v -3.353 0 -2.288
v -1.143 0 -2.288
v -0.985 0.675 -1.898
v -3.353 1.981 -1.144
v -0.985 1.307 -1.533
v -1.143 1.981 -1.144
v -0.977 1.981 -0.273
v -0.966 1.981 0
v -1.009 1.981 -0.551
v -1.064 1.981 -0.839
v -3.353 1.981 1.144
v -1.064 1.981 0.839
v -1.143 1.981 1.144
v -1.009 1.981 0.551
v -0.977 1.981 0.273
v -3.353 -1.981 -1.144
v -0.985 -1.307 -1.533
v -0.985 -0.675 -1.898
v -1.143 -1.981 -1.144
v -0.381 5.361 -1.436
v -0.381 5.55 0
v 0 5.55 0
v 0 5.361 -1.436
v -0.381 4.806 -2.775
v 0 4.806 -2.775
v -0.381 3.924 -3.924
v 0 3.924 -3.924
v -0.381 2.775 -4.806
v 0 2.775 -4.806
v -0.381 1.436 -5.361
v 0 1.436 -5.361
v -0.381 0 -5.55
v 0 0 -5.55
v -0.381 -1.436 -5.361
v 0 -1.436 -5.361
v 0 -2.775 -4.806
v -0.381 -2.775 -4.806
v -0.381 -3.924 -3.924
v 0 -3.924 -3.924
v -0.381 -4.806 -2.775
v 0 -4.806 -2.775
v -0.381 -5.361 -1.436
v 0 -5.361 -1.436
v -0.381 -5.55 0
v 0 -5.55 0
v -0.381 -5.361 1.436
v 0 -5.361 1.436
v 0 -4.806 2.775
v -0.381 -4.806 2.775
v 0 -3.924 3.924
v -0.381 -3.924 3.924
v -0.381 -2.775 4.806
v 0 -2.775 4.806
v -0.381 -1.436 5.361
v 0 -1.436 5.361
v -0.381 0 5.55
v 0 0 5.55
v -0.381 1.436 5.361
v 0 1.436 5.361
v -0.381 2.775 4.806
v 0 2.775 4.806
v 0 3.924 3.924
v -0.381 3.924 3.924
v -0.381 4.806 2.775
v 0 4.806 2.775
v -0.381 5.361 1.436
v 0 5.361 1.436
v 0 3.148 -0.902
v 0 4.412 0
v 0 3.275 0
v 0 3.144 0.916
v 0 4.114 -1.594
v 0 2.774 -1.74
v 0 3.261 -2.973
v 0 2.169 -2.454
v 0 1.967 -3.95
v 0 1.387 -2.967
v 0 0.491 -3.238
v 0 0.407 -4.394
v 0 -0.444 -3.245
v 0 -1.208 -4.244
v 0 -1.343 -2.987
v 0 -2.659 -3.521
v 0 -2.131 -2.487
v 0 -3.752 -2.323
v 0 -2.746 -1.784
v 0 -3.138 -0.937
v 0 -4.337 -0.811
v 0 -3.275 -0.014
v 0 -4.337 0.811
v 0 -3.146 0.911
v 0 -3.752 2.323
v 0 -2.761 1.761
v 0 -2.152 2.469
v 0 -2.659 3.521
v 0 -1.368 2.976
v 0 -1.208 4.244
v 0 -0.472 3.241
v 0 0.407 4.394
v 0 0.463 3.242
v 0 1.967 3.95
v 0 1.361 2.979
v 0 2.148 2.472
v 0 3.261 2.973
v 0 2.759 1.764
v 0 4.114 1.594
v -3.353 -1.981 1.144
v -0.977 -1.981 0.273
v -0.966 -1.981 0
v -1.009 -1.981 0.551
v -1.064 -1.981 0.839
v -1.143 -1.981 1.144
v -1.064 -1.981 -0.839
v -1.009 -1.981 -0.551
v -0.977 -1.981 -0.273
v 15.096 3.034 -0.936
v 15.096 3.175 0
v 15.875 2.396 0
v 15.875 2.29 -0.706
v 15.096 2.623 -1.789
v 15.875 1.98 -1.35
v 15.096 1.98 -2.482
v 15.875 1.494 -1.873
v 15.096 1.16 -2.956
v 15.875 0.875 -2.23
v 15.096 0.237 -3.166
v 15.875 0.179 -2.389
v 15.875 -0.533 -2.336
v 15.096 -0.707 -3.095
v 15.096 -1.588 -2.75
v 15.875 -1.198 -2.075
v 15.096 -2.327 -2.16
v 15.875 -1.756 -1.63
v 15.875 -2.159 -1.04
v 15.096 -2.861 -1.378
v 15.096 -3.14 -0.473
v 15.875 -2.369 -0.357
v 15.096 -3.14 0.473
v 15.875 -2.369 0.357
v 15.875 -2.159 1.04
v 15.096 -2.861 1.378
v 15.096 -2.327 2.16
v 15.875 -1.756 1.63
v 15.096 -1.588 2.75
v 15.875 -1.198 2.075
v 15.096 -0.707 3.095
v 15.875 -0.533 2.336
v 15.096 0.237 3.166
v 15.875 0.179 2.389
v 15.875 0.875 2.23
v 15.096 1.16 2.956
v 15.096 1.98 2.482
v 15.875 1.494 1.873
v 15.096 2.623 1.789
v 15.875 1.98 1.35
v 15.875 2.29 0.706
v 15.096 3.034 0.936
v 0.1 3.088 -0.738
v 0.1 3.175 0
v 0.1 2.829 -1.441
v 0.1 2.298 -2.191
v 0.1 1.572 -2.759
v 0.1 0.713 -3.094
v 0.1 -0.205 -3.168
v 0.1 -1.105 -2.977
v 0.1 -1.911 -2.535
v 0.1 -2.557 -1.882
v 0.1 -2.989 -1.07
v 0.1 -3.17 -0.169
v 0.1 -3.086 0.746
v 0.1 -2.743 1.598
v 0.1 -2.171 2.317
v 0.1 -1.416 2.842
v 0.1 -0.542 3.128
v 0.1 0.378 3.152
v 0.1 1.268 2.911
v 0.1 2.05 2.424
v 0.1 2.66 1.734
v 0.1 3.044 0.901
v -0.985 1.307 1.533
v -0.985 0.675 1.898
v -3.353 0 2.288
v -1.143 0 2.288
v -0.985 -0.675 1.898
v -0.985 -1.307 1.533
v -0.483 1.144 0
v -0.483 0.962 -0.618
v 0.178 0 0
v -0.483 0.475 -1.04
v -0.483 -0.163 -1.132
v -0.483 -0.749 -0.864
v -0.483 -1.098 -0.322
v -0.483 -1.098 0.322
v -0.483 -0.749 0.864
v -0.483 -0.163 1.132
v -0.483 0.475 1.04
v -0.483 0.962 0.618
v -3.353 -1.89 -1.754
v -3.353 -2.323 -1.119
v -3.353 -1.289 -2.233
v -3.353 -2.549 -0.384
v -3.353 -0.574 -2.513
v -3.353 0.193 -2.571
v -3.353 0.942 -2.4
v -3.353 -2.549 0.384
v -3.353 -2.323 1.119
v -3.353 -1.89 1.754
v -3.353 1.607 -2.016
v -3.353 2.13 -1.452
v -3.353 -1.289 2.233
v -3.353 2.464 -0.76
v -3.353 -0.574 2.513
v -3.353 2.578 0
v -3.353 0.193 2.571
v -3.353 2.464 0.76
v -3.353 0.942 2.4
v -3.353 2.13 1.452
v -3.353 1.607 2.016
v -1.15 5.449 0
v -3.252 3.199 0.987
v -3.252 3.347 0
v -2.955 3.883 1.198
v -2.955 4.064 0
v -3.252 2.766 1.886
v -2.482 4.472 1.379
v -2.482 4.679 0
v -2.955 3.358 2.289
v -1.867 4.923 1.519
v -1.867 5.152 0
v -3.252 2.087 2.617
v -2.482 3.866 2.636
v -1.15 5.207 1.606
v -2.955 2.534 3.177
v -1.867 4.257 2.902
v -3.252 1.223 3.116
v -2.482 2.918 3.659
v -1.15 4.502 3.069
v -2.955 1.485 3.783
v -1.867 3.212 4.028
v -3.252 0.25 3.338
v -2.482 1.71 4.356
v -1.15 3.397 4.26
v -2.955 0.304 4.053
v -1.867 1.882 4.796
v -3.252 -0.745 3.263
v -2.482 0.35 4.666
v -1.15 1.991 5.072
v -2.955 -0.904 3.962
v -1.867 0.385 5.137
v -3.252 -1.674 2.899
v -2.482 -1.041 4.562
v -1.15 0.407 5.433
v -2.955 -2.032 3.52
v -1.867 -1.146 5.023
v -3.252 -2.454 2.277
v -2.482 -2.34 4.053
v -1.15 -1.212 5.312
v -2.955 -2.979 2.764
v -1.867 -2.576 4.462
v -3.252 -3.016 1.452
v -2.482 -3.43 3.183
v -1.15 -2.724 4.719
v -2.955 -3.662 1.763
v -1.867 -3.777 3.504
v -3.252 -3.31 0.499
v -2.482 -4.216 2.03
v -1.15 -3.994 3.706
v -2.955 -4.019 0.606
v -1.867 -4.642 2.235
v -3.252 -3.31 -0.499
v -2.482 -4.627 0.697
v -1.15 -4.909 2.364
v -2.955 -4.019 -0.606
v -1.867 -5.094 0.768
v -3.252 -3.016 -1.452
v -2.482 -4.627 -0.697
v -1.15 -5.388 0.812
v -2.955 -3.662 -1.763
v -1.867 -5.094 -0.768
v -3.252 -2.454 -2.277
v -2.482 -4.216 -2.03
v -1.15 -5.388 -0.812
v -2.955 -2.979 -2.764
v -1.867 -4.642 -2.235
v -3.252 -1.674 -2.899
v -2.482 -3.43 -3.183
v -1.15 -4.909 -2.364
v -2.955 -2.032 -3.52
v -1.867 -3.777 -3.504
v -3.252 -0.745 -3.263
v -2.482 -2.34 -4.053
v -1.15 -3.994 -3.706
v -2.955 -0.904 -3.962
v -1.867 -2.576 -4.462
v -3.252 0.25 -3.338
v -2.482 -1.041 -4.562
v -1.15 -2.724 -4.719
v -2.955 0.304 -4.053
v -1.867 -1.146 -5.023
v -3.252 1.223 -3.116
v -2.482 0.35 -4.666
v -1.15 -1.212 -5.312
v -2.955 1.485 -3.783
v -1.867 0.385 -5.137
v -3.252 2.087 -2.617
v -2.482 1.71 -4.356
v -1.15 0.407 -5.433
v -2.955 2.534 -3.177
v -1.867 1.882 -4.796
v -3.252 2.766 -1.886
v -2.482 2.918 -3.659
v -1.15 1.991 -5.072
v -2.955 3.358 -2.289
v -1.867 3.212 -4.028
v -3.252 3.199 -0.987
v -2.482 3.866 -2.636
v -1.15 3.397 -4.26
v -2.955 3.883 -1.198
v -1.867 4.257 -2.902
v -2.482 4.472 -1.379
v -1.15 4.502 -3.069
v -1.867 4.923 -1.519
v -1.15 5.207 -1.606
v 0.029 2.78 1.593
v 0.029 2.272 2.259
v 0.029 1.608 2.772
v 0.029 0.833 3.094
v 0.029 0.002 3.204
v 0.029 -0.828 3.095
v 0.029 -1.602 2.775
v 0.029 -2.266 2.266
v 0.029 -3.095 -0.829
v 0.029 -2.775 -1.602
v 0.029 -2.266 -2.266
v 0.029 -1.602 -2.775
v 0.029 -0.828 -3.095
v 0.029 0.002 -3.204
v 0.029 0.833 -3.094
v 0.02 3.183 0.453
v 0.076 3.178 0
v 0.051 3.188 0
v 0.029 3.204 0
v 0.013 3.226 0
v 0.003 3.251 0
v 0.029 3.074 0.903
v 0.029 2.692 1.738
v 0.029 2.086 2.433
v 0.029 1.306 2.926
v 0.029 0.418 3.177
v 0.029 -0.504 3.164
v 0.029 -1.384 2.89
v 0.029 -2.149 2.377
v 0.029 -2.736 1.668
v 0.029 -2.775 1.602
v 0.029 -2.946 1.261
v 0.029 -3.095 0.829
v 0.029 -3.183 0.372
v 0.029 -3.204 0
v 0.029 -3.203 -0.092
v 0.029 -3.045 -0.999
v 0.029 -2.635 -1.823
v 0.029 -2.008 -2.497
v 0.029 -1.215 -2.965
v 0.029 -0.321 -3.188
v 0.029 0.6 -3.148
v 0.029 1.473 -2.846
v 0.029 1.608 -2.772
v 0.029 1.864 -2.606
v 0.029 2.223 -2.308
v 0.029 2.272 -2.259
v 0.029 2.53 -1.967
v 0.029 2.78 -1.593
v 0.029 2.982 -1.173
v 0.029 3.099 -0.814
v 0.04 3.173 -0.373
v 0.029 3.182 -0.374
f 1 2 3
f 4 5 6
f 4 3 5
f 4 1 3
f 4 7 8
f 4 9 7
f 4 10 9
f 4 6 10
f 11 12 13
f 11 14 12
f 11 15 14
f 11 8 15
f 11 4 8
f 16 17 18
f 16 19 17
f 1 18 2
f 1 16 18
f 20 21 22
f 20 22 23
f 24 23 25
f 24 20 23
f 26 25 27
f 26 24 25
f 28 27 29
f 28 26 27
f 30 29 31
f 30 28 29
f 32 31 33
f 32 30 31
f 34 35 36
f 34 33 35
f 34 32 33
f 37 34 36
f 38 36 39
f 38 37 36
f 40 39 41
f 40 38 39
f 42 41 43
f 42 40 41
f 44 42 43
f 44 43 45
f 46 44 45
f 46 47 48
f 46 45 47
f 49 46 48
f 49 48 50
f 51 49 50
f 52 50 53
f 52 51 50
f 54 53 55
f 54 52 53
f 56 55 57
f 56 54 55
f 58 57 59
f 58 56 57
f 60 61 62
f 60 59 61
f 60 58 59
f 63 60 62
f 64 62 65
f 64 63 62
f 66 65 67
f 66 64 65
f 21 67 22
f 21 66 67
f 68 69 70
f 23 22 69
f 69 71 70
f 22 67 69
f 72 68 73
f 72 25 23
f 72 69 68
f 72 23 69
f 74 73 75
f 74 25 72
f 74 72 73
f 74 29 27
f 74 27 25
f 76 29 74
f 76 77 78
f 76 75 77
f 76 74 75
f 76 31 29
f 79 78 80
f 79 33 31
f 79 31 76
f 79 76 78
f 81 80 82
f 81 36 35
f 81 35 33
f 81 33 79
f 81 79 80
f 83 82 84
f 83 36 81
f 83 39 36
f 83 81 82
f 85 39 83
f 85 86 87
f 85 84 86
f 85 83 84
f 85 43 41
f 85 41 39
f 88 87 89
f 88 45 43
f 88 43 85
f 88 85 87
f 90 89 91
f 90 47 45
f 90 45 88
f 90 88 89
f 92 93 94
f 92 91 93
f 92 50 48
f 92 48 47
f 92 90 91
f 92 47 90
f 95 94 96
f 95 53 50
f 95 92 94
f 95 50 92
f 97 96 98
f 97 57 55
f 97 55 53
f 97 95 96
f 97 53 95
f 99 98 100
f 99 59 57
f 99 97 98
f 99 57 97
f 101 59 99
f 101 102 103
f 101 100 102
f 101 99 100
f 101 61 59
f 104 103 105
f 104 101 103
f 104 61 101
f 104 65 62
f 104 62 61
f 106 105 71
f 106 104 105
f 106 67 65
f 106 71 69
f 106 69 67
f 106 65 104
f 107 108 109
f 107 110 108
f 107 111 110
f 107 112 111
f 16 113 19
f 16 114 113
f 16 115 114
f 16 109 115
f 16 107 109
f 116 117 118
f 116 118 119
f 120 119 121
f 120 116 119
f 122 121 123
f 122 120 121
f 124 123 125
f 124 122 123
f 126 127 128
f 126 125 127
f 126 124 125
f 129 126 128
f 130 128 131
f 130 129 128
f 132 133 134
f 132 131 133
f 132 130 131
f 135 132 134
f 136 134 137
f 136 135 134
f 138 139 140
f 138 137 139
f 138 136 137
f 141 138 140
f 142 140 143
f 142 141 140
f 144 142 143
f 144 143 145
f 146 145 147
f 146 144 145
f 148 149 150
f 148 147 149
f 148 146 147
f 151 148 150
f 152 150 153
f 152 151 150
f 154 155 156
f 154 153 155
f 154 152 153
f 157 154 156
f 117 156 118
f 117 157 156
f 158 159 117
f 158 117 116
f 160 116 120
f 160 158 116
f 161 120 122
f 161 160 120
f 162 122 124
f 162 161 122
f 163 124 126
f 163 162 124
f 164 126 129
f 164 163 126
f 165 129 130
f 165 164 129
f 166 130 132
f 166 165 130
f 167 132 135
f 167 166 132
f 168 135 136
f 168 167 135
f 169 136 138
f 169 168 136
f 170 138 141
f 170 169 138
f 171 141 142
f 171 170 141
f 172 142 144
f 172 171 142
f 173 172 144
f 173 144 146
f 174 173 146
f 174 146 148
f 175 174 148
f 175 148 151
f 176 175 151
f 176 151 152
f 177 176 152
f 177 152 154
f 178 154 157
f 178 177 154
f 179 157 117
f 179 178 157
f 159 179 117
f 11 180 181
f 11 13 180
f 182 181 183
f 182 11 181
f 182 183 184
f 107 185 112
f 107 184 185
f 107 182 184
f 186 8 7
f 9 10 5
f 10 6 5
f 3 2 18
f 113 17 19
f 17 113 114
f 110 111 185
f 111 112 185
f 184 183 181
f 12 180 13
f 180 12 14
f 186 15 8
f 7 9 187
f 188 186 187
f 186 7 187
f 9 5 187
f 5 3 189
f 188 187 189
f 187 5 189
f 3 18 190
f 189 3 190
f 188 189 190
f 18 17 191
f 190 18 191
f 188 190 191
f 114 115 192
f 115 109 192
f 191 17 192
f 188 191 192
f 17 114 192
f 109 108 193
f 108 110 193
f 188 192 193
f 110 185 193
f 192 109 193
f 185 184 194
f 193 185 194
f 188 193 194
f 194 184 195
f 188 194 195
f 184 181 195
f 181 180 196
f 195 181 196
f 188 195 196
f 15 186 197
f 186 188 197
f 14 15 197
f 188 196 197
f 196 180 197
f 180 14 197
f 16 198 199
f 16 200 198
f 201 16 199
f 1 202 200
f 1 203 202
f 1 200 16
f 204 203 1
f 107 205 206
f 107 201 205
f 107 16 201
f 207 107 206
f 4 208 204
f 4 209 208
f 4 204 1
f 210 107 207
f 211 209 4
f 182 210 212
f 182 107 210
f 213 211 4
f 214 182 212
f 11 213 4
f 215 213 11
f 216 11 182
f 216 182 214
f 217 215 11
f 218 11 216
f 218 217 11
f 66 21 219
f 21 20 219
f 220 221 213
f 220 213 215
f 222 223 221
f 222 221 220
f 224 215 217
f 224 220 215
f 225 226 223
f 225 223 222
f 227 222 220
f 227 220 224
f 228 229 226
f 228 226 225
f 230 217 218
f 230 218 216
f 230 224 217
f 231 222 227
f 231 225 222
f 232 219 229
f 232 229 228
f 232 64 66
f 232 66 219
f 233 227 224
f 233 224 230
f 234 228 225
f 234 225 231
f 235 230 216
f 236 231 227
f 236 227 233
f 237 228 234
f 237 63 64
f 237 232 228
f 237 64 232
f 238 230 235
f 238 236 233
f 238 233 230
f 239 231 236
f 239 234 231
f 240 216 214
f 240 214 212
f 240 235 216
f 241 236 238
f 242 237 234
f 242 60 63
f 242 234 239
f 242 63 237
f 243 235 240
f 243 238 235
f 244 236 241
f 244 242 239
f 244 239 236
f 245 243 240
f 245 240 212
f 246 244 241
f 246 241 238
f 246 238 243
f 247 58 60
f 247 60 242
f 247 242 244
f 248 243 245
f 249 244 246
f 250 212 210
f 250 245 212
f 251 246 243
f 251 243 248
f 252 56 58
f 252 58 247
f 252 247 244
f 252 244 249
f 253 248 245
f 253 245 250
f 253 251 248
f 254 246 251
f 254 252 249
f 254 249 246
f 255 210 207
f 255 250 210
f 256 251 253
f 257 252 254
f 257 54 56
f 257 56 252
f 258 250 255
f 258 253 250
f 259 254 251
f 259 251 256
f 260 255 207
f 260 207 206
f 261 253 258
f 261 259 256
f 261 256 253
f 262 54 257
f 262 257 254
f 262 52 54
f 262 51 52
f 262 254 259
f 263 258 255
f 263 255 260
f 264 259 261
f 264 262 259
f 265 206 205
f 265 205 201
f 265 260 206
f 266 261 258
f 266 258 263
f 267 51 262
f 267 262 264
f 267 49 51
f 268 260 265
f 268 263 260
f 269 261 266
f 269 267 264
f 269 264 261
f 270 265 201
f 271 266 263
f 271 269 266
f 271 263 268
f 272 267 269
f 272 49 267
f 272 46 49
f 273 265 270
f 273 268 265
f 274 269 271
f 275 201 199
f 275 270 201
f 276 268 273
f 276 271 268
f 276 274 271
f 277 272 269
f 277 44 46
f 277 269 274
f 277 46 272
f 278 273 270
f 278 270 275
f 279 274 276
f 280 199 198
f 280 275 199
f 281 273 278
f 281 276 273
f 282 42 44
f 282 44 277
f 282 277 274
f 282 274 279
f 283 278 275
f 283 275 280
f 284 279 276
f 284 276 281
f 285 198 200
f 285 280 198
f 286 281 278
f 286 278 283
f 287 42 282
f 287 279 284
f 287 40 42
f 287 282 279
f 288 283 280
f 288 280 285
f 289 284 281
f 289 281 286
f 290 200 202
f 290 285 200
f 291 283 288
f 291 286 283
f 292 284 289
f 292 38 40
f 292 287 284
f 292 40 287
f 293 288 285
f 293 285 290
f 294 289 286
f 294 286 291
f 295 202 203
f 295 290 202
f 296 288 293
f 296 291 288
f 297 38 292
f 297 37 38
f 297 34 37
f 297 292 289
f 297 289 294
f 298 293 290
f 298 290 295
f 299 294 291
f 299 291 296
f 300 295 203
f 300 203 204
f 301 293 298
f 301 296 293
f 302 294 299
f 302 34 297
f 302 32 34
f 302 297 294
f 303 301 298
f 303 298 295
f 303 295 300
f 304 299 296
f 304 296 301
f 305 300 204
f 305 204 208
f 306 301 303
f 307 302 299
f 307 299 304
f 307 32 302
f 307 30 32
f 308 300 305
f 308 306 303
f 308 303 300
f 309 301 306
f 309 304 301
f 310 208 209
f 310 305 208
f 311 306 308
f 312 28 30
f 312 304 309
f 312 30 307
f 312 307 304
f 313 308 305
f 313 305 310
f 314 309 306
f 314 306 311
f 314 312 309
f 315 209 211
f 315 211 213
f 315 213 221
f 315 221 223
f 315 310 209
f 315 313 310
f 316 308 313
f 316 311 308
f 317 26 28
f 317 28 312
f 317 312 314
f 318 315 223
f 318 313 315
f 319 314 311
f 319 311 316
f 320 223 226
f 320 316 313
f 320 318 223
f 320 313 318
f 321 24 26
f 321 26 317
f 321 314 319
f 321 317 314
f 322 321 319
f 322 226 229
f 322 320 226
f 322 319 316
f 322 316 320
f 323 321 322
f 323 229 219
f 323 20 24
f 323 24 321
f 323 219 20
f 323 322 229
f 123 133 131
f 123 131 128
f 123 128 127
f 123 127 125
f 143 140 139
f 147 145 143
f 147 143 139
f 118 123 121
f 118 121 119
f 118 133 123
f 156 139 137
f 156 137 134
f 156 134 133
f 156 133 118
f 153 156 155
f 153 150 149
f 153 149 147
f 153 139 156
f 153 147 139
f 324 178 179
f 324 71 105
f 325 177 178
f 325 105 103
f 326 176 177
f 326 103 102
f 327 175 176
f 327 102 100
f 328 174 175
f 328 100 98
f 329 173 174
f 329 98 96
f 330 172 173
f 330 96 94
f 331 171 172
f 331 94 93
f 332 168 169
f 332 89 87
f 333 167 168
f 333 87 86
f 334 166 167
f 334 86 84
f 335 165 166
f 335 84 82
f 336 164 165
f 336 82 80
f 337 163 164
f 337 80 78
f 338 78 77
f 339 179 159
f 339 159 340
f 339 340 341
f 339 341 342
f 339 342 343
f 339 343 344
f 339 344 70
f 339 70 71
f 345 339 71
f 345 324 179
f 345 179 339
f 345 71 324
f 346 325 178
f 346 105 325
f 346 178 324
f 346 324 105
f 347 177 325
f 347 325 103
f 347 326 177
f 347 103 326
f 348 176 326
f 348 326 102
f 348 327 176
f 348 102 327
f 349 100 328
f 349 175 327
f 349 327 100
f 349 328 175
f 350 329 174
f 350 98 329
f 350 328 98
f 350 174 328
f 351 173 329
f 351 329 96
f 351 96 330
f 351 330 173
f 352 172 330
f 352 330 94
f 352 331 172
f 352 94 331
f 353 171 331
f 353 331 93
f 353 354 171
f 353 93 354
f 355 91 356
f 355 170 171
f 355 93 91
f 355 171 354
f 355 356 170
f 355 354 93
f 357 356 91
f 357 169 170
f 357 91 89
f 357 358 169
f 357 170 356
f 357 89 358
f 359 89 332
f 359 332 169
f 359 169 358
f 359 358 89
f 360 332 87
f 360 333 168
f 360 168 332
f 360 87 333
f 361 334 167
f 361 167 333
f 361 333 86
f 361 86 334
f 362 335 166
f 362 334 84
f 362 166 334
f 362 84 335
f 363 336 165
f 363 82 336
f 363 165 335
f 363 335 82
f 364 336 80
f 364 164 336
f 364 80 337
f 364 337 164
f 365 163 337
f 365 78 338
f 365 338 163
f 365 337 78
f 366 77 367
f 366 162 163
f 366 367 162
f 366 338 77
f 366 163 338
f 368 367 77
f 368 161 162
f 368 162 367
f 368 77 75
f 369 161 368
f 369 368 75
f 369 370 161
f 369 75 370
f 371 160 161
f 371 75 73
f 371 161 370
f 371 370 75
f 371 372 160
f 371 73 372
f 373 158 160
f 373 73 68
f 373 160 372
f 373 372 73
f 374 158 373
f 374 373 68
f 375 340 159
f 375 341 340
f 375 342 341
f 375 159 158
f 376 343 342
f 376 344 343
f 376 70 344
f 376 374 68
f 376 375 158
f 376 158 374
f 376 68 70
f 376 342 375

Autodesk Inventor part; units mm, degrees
ref_plane "YZ Plane" through (0, 0, 0) normal (1, 0, 0) x (0, 1, 0)
ref_plane "XZ Plane" through (0, 0, 0) normal (0, 1, 0) x (-1, 0, 0)
sketch "Sketch1" plane through (0, 0, 0) normal (0, 0, 1) x (1, 0, 0)
  line L0 (0.1778, 0) -> (15.875, 0)
  line L1 (15.875, 0) -> (15.875, 3.175)
  line L2 (15.875, 3.175) -> (2.5402, 3.175)
  line L3 (2.5402, 3.175) -> (0.0001, 3.175)
  line L4 (0.0001, 3.175) -> (0, 3.175)
  line L5 (0, 3.175) -> (0, 5.5499)
  line L6 (0, 5.5499) -> (-3.3528, 5.5499)
  line L7 (-3.3528, 5.5499) -> (-3.3528, 2.2877)
  line L8 (-3.3528, 2.2877) -> (-1.143, 2.2877)
  line L9 (-1.143, 2.2877) -> (0.1778, 0)
  line L10 (-7.1984, 0) -> (19.7206, 0) projected
  line L11 (0, -1.11) -> (0, 6.6599) projected
  line L12 (2.5402, 3.175) -> (0, 3.175) construction
  dimension "d1" = 13.3348
  dimension "d2" = 2.5401
  dimension "d3" = 3.3528
  dimension "d4" = 2.2098
  dimension "d5" = 60
  dimension "d6" = 6.35
  dimension "d7" = 6.35
  dimension "d8" = 4.5754
  dimension "d9" = 11.0998
  dimension "d26" = 15.875
revolve "Body" add sketch "Sketch1" angle 360 about axis through (0.1778, 0, 0) along (1, 0, 0) contours L9 L11 L3 L2 L1 L0 | L9 L8 L7 L6 L5 L11
sketch "Sketch2" plane through (-3.3528, 0, 0) normal (-1, 0, 0) x (0, 0, 1)
  circle A0 centre (0, 0) radius 2.2877 projected
  line L0 (0, -7.7699) -> (0, 7.7699) projected
  line L1 (-7.7699, 0) -> (7.7699, 0) projected
  line L2 (2.2877, 0) -> (1.1438, -1.9812)
  line L3 (1.1438, -1.9812) -> (-1.1438, -1.9812)
  line L4 (-1.1438, -1.9812) -> (-2.2877, 0)
  line L5 (-2.2877, 0) -> (-1.1438, 1.9812)
  line L6 (-1.1438, 1.9812) -> (1.1438, 1.9812)
  line L7 (1.1438, 1.9812) -> (2.2877, 0)
  point P0 (0, 0)
extrude "Slot" add sketch "Sketch2" against normal up to next contours L7 A0 | A0 L2 | L6 L0 A0 | A0 L0 L3 | L0 L6 A0 | A0 L3 L0 | L4 A0 | A0 L5
fillet "Fillet1" radius 2.9718 1 edges at (-3.3528, -5.5499, 0)
thread "Thread" size "1/4-20 UNC" class "2A" standard "ANSI Unified Screw Threads" length 13.3348
chamfer "Chamfer1" distance 0.779 distance2 0.779 1 edges at (15.875, -3.175, 0) measured on face at (15.875, 0.0983, -0.8099)
ref_plane "Work Plane1" through (29, 0, 0) normal (0, -1, 0) x (1, 0, 0)
fillet "Fillet2" radius 0.1 1 edges at (0.0001, -3.175, 0)
equation "\"d1\" = GEL"
equation "\"d3\" = KOH"
equation "\"d4\" = INTI"
equation "\"d6\" = GD"
equation "\"d7\" = BDM"
equation "\"d8\" = 1.1547 * SW"
equation "\"d9\" = KOD"
equation "\"d26\" = NLG"
equation "\"d30\" = R"
equation "\"d17\" = RR"
equation "\"d13\" = GEL"
equation "\"d15\" = -0.5 * SPD + 0.5 * GD"
equation "\"d16\" = GUL"
equation "\"GD\" = NND"
equation "\"NLG\" = 15.875"
equation "\"GEL\" = 13.3348"
equation "\"KOD\" = 11.0998"
equation "\"KOH\" = 3.3528"
equation "\"INTI\" = 2.2098"
equation "\"GAL\" = 2.54"
equation "\"GUL\" = 0.77902"
equation "\"BDM\" = NND"
equation "\"SW\" = 3.9624"
equation "\"RR\" = 2.9718"
equation "\"SPD\" = 4.79196"
equation "\"R\" = 0.1"
equation "\"TOA\" = 30deg"
equation "\"GD1\" = SPD"
equation "\"THREADDIA\" = 6.35"
equation "\"KOH1\" = 0.7874"
equation "\"NND\" = 6.35"
equation "\"E0\" = 4.57657"
properties part number "ANSI B18.3 - 1/4 - 20 x 5/8" material "Steel, Mild"
